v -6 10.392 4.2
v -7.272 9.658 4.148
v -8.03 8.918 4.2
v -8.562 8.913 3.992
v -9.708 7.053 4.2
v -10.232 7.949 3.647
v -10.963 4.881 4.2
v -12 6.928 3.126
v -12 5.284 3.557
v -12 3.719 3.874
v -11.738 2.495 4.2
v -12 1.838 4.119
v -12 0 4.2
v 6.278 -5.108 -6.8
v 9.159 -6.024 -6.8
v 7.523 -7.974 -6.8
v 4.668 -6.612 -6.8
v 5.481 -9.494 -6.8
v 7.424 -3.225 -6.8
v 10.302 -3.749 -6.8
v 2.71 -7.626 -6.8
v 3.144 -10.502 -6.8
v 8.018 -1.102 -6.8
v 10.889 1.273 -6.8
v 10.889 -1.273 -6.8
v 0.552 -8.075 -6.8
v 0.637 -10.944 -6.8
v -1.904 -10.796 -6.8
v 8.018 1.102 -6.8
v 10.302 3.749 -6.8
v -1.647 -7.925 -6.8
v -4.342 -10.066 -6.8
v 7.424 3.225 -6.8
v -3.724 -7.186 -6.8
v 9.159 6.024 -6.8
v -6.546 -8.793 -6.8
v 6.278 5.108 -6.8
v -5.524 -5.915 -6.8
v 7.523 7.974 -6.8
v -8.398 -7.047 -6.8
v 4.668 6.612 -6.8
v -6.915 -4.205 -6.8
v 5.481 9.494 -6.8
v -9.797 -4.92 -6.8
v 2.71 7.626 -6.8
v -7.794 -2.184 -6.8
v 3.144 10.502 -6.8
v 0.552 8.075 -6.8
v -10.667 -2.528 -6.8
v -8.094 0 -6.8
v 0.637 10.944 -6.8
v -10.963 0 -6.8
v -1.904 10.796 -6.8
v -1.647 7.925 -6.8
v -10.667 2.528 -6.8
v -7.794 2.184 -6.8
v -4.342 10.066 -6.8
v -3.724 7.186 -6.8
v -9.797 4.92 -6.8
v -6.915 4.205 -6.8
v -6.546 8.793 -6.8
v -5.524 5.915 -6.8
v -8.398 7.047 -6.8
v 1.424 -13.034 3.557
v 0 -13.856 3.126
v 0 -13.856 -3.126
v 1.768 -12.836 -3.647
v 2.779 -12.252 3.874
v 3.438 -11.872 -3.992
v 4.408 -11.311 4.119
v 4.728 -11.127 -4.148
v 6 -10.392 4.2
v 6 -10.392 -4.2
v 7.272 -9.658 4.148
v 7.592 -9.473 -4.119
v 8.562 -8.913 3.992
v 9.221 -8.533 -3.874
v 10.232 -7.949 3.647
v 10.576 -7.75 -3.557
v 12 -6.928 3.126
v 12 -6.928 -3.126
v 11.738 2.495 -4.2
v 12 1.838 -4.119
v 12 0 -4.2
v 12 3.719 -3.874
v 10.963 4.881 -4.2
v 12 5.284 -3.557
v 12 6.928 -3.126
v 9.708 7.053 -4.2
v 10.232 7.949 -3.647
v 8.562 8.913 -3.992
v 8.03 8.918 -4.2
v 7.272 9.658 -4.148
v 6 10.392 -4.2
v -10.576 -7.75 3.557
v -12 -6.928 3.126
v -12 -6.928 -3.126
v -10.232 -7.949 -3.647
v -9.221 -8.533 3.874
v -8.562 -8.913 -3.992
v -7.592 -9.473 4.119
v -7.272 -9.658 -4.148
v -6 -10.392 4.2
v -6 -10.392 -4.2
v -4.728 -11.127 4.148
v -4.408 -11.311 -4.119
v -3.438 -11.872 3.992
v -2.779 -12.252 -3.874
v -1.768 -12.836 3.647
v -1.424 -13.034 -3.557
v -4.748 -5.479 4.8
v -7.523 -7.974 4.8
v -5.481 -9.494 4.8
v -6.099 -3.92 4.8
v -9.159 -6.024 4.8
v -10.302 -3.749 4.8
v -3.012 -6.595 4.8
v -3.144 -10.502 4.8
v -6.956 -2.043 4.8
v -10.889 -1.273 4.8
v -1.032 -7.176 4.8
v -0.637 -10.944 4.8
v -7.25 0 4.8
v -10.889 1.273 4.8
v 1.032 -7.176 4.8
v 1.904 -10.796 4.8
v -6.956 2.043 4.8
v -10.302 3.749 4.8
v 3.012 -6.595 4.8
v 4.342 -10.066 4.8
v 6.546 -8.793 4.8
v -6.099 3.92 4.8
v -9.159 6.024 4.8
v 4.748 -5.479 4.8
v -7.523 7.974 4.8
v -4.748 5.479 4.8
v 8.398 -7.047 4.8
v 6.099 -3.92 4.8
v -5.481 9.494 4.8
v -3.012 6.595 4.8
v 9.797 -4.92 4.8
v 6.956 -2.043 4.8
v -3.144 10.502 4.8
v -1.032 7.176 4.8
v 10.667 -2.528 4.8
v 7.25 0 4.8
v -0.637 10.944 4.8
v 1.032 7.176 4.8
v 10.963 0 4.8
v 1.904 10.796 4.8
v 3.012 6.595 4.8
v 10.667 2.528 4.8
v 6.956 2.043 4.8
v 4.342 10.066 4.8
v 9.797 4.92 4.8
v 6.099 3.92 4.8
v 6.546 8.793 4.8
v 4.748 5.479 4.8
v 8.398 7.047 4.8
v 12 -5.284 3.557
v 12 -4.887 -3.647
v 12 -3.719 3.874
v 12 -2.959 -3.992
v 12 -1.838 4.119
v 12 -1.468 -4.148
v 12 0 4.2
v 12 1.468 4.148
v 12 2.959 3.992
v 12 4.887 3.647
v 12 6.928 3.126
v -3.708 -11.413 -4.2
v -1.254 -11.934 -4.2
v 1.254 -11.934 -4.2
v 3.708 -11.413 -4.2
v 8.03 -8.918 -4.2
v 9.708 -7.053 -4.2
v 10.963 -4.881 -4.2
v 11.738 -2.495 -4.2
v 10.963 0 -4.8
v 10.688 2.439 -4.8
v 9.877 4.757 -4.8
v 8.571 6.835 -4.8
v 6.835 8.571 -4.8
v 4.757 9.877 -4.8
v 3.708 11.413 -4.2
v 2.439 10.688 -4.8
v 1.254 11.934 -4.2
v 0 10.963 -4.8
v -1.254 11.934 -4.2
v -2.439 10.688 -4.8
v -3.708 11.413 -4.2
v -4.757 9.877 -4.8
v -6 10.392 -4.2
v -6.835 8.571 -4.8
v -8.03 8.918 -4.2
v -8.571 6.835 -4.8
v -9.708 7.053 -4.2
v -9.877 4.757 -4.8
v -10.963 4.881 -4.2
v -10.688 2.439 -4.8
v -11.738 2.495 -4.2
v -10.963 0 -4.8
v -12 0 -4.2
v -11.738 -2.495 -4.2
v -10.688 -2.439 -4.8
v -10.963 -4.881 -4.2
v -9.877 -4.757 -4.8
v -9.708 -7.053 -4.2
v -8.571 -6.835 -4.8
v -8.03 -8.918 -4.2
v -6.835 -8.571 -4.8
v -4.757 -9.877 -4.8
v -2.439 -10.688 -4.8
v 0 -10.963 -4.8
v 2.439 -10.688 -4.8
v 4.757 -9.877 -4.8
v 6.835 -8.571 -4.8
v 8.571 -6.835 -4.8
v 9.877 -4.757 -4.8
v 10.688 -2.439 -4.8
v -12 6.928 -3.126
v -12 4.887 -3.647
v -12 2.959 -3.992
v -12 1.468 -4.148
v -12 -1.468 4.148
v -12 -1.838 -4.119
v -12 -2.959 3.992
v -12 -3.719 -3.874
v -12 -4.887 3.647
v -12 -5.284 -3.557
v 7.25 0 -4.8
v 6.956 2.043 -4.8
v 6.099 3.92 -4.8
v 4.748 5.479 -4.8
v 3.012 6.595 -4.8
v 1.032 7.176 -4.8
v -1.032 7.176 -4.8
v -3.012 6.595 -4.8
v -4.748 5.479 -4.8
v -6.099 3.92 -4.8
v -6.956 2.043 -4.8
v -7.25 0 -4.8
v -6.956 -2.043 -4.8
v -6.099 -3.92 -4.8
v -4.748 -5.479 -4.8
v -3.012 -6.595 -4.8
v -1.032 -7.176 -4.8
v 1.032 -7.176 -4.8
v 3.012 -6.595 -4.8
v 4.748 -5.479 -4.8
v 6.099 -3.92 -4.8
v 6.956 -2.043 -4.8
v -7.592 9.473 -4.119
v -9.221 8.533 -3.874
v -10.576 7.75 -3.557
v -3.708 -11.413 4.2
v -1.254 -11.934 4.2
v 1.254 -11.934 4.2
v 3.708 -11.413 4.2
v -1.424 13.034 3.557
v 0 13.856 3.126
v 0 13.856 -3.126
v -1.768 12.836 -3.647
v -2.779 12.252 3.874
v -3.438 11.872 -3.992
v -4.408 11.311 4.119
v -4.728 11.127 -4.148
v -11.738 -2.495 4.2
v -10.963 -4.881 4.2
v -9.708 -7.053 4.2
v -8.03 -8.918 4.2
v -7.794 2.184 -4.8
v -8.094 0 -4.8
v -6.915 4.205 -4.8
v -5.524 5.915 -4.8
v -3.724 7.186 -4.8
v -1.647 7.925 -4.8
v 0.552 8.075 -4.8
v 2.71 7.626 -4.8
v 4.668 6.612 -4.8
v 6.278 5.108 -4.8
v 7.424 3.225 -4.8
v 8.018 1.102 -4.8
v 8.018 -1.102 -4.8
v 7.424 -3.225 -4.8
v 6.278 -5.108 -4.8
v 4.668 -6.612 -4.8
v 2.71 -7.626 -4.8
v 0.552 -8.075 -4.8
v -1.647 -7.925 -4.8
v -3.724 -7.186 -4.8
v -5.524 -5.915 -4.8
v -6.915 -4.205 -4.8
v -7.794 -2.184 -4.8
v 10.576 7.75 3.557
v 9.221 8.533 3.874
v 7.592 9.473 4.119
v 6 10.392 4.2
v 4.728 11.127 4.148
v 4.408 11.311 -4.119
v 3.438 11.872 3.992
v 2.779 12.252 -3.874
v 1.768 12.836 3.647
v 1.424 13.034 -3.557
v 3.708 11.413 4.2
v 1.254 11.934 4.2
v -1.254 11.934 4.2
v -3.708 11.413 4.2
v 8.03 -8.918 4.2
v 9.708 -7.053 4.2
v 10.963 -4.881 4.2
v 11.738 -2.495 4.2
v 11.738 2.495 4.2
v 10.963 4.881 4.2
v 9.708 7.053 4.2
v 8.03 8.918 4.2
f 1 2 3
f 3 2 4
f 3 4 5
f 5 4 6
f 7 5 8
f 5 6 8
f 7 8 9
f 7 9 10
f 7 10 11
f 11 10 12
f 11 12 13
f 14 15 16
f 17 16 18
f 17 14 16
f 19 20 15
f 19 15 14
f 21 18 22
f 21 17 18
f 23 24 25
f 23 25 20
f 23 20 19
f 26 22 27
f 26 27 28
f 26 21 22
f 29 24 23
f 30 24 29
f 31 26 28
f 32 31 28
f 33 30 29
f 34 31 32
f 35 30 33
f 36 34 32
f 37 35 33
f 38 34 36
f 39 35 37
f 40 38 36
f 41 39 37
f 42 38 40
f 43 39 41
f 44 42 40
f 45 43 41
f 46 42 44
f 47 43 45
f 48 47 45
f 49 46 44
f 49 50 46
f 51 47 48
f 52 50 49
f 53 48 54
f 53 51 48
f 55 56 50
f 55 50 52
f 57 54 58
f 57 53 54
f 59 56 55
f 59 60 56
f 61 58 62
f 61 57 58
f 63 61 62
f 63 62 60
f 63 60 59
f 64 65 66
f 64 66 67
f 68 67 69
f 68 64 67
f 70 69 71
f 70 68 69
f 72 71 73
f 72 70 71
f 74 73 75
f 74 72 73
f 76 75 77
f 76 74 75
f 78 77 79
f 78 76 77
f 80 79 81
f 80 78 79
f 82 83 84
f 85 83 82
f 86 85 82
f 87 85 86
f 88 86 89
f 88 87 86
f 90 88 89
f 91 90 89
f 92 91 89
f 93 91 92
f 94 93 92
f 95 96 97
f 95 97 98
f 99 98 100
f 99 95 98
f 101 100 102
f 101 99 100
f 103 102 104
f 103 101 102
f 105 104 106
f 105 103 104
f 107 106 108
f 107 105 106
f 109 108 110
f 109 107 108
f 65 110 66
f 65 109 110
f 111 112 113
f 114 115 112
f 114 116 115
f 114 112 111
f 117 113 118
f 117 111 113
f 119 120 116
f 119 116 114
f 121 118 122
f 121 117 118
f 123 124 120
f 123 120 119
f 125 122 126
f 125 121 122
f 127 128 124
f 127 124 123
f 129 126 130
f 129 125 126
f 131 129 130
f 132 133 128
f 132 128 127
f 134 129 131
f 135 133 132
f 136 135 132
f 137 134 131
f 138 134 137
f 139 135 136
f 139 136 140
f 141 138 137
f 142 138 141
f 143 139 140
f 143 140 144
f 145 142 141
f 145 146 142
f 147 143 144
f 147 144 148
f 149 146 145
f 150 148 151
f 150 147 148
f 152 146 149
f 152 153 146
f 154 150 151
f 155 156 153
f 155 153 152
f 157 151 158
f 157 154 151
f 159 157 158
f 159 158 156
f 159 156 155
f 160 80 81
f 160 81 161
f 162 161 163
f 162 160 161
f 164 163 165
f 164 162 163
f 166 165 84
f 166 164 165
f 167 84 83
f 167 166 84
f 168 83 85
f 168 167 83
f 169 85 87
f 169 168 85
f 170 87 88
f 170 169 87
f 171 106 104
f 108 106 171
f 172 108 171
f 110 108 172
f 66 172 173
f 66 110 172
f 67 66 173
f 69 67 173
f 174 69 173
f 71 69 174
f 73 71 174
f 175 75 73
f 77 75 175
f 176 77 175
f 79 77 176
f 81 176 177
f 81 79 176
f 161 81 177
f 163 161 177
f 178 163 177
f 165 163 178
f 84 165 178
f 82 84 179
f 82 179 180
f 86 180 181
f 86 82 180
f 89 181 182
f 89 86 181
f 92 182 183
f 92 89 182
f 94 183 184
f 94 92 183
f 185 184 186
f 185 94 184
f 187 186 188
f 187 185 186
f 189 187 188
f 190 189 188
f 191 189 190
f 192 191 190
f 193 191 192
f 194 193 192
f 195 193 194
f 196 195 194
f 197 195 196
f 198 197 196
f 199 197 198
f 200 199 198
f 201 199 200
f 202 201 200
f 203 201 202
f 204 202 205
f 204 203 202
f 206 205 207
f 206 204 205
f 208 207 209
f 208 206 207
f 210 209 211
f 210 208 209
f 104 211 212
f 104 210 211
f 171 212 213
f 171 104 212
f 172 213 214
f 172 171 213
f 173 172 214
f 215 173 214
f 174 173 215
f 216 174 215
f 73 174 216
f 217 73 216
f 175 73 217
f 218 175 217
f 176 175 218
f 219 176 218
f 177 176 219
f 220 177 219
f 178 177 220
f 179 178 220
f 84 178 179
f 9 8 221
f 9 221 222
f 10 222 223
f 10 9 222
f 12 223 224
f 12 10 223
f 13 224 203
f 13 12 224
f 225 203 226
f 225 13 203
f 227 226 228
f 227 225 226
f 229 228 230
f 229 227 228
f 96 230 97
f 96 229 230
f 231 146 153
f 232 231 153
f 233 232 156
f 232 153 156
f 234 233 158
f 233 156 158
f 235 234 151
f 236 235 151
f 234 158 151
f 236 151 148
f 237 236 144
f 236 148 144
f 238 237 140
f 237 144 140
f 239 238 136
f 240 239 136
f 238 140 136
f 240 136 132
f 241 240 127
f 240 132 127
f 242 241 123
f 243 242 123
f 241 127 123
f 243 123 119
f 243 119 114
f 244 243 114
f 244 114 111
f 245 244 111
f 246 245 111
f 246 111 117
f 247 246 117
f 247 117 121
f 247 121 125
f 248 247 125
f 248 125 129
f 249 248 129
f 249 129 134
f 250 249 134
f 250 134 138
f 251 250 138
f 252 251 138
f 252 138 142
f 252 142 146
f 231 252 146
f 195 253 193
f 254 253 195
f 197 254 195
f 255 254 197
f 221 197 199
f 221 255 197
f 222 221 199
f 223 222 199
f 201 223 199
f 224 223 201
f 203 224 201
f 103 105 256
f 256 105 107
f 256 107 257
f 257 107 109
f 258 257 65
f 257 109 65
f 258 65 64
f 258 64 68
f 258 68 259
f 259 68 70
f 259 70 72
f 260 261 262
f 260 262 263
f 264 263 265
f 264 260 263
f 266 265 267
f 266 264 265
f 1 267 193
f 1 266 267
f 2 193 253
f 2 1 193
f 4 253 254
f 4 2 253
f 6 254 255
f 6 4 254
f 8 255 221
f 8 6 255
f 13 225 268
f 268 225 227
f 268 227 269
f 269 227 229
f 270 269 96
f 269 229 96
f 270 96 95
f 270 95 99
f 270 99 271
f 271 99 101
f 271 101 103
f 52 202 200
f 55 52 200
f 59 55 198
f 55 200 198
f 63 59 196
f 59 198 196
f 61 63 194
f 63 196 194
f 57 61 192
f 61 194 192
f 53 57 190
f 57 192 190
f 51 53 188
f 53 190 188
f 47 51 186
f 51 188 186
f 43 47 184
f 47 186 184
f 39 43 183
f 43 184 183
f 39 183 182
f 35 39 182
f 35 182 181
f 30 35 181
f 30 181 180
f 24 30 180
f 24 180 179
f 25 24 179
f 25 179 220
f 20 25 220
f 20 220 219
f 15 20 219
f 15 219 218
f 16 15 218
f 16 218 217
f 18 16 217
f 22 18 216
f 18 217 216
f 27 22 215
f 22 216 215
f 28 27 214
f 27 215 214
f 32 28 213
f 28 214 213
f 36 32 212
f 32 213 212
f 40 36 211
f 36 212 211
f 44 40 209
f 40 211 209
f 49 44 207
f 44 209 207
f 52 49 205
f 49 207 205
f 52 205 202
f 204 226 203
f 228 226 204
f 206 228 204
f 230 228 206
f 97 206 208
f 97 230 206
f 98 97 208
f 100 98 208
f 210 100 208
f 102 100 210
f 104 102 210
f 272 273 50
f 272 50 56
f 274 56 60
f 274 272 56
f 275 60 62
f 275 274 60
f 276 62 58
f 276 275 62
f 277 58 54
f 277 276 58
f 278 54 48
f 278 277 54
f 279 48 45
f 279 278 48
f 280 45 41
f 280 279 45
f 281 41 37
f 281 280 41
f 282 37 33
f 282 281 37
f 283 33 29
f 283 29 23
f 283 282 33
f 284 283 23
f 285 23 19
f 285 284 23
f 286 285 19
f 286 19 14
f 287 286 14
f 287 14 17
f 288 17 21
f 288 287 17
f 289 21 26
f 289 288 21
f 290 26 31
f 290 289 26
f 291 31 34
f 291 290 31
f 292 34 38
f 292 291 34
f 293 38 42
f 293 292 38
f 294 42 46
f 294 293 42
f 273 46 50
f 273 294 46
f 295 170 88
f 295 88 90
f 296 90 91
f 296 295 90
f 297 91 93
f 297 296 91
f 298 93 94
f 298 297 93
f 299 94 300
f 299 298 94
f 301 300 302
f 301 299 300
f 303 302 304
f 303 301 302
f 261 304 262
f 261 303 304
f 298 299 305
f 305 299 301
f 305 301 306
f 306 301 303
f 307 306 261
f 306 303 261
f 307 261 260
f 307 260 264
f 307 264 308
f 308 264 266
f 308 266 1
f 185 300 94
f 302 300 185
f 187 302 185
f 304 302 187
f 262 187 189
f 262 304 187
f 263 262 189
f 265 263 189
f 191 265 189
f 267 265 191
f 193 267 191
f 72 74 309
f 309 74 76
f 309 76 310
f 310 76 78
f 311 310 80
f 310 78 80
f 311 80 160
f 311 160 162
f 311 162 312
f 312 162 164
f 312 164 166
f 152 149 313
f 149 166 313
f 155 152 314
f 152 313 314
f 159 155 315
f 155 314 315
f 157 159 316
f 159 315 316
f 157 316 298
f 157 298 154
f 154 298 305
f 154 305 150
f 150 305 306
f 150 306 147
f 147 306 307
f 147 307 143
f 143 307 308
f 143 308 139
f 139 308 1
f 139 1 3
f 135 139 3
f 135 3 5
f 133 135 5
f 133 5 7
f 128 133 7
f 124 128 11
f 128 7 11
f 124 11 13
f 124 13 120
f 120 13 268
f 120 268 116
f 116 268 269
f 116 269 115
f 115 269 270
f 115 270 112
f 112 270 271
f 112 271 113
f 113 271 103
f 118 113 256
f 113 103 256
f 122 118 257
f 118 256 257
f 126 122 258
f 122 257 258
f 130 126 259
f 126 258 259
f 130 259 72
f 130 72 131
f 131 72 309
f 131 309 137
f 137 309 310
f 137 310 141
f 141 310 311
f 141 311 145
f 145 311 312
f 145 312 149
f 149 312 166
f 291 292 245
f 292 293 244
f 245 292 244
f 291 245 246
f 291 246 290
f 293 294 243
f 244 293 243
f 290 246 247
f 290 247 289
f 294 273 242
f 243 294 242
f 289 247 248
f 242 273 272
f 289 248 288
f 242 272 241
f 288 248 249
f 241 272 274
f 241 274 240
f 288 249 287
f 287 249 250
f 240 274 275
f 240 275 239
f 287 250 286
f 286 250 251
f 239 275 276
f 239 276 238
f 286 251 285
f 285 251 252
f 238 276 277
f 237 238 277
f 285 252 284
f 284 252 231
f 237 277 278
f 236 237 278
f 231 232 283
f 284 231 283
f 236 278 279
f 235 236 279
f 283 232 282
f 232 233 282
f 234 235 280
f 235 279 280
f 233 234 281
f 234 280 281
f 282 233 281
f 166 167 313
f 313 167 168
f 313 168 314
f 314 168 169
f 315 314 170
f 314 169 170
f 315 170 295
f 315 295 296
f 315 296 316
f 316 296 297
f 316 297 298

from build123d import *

# Parameters (mm, degrees)
EXTRUDE_1_DEPTH     = 4.8
SKETCH_3_R          = 7.25
CUT_EXTRUDE_1_DEPTH = 21.69202745
SKETCH_4_R          = 10.962716089
SKETCH_4_R_2        = 8.093789305
EXTRUDE_2_DEPTH     = 2


with BuildPart() as part:
    # 草图1 → 凸台-拉伸1 (new, symmetric)
    with BuildSketch(Plane.XY):
        Polygon((12, -6.92820323), (12, 6.92820323), (0, 13.856406461), (-12, 6.92820323), (-12, -6.92820323), (0, -13.856406461), align=None)
    extrude(amount=EXTRUDE_1_DEPTH, both=True)

    # 草图2 → 切除-旋转1 (revolve, cut)
    with BuildSketch(Plane(origin=(0, 0, 0), x_dir=(1, 0, 0), z_dir=(0, 1, 0))):
        Polygon((15.485203874, 8.108548082), (5.242876598, 8.108548082), (12, 4.2), (23.530399305, -2.469571859), align=None)
    cut_revolve_1 = revolve(axis=Axis((0, 0, -6.79329682), (0, 0, 1)), mode=Mode.SUBTRACT)

    # 镜向1: 切除-旋转1 across plane
    add(cut_revolve_1.mirror(Plane.XY), mode=Mode.SUBTRACT)

    # 草图3 → 切除-拉伸1 (cut, through all)
    with BuildSketch(Plane.XY.offset(4.8)):
        Circle(SKETCH_3_R)
    extrude(amount=-CUT_EXTRUDE_1_DEPTH, mode=Mode.SUBTRACT)

    # 草图4 → 凸台-拉伸2 (add)
    with BuildSketch(Plane(origin=(0, 0, -4.8), x_dir=(-1, 0, 0), z_dir=(0, 0, -1))):
        Circle(SKETCH_4_R)
        Circle(SKETCH_4_R_2, mode=Mode.SUBTRACT)
    extrude(amount=EXTRUDE_2_DEPTH)


solid = part.part
